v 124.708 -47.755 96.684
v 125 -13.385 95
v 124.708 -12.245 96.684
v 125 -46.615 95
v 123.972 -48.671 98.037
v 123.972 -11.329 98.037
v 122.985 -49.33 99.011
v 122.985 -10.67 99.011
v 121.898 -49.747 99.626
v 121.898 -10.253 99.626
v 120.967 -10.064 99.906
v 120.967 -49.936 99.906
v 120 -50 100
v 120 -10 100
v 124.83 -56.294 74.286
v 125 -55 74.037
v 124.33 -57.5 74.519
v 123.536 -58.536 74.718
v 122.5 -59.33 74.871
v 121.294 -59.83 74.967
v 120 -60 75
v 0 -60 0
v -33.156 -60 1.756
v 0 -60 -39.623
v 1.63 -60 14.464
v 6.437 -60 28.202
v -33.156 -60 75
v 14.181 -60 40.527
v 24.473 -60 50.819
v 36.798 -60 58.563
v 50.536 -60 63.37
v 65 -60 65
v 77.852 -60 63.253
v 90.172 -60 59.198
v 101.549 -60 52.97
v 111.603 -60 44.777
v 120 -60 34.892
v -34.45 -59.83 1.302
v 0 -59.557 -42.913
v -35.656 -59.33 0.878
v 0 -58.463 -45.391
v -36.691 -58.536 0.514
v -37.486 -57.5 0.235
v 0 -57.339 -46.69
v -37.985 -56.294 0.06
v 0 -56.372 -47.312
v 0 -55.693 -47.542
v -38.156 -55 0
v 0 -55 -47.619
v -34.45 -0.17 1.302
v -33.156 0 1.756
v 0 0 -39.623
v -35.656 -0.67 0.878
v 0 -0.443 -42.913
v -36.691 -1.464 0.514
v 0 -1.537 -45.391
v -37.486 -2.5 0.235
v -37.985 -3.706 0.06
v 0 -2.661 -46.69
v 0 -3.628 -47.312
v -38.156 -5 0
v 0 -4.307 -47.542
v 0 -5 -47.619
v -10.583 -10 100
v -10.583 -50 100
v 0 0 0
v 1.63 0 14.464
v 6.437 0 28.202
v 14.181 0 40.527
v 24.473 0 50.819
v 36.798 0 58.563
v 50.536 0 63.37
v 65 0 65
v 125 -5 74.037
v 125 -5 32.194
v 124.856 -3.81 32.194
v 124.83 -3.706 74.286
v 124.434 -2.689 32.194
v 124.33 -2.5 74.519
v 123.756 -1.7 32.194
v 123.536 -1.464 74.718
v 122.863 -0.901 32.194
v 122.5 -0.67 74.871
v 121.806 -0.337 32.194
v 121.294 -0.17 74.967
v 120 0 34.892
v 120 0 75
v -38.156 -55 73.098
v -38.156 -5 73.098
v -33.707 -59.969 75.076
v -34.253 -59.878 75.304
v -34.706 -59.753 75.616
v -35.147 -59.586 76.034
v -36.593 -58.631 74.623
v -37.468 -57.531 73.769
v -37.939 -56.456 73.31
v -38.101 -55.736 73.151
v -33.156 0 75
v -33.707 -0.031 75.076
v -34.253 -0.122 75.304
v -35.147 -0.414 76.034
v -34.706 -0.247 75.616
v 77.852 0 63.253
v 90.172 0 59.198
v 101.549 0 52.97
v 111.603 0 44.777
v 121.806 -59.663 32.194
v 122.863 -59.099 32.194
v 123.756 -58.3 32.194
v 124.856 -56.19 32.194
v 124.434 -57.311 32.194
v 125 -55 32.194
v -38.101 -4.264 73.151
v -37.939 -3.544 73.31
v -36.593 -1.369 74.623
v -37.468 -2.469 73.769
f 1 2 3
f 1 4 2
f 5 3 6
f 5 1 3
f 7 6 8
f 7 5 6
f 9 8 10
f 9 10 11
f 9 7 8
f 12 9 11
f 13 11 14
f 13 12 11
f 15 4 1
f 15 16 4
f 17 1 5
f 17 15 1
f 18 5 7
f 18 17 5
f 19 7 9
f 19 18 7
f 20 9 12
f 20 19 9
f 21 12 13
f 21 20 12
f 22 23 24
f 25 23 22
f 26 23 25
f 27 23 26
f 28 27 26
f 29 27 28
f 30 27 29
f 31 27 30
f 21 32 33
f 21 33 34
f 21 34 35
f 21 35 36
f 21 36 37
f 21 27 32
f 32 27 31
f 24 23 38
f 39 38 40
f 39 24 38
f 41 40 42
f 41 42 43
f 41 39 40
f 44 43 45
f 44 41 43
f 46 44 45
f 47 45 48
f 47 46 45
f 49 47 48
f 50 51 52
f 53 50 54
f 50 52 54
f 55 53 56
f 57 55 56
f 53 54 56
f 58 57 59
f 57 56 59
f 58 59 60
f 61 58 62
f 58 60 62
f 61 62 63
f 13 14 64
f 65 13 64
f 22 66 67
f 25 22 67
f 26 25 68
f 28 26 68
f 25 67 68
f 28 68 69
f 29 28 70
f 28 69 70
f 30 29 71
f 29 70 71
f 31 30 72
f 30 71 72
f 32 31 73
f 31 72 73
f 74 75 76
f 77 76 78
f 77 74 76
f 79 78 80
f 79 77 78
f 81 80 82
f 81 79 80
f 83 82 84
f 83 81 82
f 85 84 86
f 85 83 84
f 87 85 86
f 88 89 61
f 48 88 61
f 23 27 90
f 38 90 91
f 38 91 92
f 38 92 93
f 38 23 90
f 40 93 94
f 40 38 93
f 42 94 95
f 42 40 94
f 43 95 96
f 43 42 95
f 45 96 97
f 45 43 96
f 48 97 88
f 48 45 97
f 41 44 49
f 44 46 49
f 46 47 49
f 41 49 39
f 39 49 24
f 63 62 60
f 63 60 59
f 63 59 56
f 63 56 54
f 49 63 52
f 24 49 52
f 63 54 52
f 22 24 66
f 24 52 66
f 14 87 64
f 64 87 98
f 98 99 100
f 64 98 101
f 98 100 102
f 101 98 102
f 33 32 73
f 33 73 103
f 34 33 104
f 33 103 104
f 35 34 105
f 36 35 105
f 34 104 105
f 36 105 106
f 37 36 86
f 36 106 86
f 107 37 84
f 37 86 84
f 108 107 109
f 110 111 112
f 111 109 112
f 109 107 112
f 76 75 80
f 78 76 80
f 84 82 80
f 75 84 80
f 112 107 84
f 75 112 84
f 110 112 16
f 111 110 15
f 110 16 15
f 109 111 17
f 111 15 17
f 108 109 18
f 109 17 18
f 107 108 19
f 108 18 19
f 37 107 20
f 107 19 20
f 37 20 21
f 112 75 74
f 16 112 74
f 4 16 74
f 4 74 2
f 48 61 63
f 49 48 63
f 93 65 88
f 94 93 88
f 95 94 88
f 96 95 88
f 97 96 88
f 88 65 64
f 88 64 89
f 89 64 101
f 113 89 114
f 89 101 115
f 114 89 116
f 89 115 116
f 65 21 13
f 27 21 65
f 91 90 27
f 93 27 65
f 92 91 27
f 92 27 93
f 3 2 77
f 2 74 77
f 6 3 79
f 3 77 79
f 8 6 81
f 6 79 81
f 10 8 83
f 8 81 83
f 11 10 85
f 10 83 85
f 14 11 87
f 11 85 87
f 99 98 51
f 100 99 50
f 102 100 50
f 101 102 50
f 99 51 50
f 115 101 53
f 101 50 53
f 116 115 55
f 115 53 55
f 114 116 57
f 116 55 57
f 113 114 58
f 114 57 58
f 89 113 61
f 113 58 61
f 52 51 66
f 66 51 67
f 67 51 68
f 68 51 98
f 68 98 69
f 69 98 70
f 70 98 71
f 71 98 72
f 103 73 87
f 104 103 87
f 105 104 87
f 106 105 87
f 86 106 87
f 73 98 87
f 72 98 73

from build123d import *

# Parameters (mm, degrees)
F1_DEPTH = 60
F2_SIZE2 = 25
F2_SIZE  = 10
F3_R     = 5


with BuildPart() as f1:
    # F0 (on Front) → F1 (new body)
    with BuildSketch(Plane.XZ):
        with BuildLine():
            Line((125, 32.1942828596), (125, 75))
            Line((125, 75), (125, 100))
            Line((125, 100), (-10.5827422813, 100))
            Line((-10.5827422813, 100), (-38.1556677818, 73.0981135368))
            Line((-38.1556677818, 73.0981135368), (-38.1556677818, 0))
            Line((-38.1556677818, 0), (0, -47.6187802851))
            Line((0, -47.6187802851), (0, 0))
            ThreePointArc((0, 0), (19.0380592229, 45.9619407771), (65, 65))
            ThreePointArc((65, 65), (97.417599338, 55.5490608419), (121.8056157231, 32.1942828596))
            Line((121.8056157231, 32.1942828596), (125, 32.1942828596))
        make_face()
    extrude(amount=F1_DEPTH)

    # F2
    f2_edges = [f1.edges().sort_by_distance(p)[0] for p in [
        (57.208629, -60, 100),
        (57.208629, 0, 100),
    ]]
    f2_side = f1.faces().sort_by_distance((57.208629, -30, 100))[0]
    chamfer(f2_edges, length=F2_SIZE, length2=F2_SIZE2, reference=f2_side)

    # F3
    f3_edges = [f1.edges().sort_by_distance(p)[0] for p in [
        (125, -30, 100),
        (125, -60, 53.597141),
        (125, 0, 53.597141),
        (-38.155668, -60, 36.549057),
        (-38.155668, 0, 36.549057),
        (-19.077834, 0, -23.80939),
        (-19.077834, -60, -23.80939),
        (125, -5, 87.5),
        (125, -55, 87.5),
    ]]
    fillet(f3_edges, radius=F3_R)


solid = f1.part
